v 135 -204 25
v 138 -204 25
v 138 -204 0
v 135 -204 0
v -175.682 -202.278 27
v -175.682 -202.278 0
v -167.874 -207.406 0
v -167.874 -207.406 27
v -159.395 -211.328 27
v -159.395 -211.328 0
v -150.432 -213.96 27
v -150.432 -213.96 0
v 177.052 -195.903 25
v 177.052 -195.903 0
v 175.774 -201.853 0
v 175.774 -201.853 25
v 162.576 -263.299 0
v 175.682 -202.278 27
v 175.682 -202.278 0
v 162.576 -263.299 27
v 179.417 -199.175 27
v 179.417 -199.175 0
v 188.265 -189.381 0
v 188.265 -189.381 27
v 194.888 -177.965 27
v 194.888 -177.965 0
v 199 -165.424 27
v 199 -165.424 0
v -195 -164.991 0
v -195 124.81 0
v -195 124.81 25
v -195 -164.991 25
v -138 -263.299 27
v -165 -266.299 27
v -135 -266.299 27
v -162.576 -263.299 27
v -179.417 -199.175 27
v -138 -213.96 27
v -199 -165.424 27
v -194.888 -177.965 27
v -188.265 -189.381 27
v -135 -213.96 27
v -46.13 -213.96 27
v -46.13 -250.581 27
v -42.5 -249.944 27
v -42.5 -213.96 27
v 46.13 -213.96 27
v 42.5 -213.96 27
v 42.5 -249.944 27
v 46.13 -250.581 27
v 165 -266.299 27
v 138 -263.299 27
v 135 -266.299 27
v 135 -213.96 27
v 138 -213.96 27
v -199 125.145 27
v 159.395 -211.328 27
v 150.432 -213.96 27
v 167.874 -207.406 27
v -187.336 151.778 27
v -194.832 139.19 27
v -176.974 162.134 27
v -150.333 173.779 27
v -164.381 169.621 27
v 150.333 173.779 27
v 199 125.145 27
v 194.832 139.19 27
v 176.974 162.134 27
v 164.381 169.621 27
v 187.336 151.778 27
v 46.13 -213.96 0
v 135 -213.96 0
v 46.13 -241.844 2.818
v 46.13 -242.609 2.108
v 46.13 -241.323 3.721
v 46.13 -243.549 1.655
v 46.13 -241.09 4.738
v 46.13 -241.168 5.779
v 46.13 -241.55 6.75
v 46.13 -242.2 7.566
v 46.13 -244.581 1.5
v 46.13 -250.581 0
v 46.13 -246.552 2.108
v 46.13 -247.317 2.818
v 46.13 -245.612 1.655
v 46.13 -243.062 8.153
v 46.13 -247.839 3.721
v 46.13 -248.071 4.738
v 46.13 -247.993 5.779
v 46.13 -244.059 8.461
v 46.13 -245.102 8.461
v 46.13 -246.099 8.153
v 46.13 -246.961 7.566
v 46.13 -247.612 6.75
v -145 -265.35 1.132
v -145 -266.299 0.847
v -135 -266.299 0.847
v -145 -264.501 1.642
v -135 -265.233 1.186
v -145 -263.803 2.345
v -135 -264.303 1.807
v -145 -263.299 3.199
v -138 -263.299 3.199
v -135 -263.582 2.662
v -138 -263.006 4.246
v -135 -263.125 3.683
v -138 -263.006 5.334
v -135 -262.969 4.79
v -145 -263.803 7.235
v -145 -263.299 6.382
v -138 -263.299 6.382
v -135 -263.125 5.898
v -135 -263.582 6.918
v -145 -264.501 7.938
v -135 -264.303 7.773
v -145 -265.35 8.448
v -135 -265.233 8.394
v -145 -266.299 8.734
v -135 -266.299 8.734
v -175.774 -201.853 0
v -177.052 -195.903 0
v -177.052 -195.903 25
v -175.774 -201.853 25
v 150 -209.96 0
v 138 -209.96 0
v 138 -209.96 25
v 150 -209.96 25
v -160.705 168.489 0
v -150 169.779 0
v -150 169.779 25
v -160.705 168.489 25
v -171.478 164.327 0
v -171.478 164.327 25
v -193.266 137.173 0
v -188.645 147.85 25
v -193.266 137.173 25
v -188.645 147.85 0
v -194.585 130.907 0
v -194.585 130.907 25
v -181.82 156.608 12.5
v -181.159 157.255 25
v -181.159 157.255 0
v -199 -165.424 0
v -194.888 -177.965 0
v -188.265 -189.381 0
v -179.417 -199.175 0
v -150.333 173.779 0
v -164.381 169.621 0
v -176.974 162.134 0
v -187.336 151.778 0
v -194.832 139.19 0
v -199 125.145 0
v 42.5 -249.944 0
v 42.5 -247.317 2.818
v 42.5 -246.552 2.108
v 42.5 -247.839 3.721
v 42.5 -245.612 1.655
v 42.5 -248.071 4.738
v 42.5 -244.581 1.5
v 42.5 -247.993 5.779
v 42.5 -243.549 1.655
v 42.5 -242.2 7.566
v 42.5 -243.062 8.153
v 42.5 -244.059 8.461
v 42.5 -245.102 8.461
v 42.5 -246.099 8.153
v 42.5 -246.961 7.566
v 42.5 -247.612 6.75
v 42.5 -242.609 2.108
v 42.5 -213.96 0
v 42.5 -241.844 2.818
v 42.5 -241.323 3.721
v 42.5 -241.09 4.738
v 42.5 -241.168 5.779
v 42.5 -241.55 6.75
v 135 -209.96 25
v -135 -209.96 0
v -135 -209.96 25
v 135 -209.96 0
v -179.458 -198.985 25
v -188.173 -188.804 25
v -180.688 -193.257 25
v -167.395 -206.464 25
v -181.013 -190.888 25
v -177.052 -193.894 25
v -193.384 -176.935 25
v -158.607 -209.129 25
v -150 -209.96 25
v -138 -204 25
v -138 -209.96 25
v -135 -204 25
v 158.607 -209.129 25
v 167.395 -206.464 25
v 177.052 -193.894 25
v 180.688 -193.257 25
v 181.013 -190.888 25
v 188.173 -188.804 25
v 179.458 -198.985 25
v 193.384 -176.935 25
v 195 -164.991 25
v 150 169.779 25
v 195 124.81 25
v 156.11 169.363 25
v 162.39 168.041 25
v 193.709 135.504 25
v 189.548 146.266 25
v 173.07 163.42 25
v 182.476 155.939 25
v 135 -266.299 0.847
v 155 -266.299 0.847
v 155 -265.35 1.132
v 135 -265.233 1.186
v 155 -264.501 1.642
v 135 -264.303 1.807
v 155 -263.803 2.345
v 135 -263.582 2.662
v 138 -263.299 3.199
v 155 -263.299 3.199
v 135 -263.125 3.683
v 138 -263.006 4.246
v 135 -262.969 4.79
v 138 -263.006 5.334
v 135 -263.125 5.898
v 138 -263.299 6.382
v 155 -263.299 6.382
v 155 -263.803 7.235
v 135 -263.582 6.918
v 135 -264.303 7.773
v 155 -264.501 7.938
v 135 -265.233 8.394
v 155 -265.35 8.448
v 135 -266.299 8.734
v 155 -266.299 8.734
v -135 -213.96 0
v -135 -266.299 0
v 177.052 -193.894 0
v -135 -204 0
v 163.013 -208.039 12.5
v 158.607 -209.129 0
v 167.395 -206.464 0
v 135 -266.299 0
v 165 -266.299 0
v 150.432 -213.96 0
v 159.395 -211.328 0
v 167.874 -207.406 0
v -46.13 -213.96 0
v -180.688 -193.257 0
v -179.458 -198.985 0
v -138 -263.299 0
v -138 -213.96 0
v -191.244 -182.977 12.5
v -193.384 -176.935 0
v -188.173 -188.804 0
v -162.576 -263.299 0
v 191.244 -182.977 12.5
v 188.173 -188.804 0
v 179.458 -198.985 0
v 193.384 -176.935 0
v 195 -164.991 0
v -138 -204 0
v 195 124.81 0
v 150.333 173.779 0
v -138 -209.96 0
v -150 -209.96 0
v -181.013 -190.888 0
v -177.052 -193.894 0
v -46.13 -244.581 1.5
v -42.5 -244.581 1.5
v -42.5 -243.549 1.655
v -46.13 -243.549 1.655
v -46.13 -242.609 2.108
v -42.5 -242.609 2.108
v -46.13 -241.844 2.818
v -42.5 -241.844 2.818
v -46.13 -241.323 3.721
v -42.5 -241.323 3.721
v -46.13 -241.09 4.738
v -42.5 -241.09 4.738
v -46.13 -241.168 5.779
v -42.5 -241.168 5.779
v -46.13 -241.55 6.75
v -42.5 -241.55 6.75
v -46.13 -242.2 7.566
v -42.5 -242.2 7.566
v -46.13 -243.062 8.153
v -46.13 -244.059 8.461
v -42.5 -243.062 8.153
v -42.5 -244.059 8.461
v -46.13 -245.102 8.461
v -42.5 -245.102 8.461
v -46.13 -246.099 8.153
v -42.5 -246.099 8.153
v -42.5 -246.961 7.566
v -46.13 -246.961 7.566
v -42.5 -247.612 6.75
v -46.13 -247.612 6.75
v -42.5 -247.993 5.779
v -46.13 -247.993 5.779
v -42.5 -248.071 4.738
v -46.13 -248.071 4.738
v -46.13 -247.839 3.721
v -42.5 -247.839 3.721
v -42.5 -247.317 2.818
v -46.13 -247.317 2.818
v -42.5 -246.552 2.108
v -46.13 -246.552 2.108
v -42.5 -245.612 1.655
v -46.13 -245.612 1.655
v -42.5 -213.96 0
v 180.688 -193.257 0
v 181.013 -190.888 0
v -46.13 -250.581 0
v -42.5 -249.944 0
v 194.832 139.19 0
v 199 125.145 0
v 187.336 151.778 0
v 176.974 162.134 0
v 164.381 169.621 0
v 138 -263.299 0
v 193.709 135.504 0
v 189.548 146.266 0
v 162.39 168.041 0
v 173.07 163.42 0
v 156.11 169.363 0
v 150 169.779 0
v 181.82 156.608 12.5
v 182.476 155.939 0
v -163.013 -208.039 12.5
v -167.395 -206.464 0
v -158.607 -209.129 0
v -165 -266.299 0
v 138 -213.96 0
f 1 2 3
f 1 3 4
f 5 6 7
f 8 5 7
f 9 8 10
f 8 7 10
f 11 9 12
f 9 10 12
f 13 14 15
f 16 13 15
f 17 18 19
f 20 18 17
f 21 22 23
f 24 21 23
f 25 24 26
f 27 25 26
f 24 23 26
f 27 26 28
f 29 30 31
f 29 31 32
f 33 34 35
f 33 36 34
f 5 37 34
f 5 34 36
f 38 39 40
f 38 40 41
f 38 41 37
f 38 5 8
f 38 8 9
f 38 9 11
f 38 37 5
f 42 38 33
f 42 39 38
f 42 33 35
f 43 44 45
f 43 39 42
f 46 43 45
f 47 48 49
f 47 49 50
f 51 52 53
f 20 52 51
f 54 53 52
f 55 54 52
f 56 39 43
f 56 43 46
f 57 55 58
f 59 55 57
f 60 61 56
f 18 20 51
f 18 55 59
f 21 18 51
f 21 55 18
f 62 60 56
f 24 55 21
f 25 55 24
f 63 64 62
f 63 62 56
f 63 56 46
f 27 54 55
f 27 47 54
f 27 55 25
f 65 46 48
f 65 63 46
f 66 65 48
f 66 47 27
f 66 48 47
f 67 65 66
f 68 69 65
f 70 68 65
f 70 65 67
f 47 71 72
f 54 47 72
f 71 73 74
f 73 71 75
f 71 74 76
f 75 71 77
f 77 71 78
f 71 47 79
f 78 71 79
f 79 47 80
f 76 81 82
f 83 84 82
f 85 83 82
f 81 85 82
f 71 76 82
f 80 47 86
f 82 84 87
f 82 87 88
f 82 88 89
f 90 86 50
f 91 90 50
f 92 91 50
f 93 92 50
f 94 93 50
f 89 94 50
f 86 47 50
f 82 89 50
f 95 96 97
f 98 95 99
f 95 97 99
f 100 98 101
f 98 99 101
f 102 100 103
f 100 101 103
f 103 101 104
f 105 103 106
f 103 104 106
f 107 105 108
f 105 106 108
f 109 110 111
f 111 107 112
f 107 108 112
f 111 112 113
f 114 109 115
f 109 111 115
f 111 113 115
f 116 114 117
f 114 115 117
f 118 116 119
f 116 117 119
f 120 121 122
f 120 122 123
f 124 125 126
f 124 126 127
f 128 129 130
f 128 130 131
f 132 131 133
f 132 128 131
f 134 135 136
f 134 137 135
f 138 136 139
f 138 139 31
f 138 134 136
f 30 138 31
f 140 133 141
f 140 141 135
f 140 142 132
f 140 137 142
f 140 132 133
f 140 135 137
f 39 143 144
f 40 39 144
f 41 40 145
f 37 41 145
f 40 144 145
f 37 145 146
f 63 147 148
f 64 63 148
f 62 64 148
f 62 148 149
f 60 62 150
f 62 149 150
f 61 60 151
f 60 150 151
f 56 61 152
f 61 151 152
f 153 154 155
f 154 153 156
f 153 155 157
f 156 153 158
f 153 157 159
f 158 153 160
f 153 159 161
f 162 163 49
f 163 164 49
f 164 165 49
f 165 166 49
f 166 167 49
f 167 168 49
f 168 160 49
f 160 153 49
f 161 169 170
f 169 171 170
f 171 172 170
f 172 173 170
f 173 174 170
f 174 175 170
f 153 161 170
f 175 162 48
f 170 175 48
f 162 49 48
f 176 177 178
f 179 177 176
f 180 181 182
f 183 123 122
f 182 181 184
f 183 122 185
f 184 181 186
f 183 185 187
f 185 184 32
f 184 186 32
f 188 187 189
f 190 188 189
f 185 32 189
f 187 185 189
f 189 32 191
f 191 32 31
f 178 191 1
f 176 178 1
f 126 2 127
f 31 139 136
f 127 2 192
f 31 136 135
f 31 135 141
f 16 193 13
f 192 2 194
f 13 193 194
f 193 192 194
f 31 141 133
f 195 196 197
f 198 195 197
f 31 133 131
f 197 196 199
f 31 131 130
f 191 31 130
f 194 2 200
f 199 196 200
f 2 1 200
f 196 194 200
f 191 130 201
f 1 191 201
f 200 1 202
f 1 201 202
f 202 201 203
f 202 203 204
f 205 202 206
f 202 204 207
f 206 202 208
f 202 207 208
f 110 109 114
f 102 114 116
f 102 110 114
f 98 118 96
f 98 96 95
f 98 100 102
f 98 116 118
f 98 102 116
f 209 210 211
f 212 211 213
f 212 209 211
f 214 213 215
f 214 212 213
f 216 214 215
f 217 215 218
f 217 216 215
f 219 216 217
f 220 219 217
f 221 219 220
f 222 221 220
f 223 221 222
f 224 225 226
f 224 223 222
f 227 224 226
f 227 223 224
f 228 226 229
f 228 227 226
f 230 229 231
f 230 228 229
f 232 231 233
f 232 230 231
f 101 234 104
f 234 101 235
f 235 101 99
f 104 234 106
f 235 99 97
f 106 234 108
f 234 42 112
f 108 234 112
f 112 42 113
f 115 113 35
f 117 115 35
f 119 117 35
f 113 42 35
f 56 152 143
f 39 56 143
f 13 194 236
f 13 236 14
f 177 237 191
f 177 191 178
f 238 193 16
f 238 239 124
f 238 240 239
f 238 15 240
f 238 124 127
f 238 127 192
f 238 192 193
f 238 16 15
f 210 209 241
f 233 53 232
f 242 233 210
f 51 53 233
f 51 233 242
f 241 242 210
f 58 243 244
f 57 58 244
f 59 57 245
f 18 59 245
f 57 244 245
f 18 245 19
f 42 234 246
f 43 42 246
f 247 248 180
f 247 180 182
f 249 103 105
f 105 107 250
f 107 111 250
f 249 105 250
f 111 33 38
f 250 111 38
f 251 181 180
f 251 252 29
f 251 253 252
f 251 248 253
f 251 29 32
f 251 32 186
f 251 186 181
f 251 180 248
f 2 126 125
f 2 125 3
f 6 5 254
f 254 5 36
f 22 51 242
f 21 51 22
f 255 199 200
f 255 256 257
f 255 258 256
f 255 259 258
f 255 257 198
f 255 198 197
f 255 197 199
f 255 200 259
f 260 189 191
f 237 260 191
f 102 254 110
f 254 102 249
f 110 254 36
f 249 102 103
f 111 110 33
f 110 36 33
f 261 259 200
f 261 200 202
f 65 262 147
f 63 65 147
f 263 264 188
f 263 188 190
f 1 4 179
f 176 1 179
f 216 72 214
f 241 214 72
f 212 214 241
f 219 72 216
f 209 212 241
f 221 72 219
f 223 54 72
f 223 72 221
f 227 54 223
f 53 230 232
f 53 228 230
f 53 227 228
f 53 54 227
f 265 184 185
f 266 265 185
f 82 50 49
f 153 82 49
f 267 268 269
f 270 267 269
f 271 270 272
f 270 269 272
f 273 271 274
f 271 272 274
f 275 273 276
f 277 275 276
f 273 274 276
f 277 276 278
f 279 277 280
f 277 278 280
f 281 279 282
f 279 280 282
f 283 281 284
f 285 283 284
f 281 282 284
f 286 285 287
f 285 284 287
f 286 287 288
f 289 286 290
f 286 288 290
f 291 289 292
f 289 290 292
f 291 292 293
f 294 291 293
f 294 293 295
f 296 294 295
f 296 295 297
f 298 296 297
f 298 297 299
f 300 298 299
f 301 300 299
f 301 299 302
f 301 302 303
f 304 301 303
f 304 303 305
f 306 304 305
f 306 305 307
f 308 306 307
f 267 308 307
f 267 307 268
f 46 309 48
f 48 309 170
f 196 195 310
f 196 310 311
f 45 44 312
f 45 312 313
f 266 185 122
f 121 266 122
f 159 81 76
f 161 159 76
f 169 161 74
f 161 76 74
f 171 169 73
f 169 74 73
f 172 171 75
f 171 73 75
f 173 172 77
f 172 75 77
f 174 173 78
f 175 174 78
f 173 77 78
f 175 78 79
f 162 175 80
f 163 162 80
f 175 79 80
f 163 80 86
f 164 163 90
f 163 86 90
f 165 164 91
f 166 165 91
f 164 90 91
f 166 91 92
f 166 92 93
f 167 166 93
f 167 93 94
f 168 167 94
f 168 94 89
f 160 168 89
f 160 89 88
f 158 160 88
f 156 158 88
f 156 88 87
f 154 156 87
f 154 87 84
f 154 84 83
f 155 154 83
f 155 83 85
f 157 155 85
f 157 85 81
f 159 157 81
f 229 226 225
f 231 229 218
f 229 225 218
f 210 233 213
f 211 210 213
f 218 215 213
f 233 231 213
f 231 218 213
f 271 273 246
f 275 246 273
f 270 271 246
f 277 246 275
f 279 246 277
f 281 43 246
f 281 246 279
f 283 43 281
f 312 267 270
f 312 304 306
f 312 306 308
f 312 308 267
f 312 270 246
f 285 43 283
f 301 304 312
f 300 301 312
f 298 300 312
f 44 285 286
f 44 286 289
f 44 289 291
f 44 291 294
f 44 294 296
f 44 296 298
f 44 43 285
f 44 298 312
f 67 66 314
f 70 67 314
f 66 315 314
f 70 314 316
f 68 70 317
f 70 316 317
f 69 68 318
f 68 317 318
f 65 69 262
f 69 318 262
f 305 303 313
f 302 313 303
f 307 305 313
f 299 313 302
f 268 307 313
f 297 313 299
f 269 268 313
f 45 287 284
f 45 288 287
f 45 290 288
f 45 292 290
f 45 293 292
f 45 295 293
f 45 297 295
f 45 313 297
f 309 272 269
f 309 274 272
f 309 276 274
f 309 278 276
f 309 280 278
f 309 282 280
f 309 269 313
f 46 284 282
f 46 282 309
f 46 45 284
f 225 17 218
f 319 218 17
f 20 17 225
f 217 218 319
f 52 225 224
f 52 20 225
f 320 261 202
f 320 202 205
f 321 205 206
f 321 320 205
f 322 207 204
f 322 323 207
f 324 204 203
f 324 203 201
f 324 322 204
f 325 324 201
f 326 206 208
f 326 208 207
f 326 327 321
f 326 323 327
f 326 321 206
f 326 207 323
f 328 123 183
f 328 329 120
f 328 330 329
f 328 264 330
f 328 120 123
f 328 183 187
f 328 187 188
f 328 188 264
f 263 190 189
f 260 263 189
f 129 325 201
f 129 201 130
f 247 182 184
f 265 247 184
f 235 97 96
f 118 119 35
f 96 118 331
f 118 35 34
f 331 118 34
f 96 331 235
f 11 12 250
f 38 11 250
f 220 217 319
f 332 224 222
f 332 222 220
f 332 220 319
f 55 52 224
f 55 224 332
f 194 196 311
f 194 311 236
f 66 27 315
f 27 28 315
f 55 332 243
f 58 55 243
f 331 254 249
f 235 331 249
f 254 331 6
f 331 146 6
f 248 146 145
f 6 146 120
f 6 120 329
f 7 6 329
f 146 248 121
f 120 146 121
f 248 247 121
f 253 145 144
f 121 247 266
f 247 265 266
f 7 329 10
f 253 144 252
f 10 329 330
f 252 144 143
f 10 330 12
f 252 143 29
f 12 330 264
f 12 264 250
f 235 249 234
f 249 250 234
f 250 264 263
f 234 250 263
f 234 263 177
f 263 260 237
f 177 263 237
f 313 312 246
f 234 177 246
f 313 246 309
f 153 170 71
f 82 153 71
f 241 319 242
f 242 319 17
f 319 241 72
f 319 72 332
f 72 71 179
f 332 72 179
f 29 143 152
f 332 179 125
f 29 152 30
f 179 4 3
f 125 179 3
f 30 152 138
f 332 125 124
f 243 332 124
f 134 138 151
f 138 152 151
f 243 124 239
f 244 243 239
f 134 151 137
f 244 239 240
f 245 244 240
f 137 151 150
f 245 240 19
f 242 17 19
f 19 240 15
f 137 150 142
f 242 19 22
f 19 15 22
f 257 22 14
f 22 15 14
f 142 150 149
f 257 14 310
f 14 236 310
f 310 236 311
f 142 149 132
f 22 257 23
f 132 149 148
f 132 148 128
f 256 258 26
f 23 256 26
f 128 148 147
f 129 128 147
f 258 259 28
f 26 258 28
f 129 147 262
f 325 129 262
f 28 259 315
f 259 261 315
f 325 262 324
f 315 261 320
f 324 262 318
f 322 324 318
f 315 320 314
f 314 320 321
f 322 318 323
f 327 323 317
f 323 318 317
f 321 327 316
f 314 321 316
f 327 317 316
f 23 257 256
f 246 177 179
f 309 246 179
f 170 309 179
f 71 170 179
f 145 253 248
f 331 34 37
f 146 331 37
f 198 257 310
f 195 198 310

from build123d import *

# Parameters (mm, degrees)
BOSS_EXTRUDE1_DEPTH     = 25
BOSS_EXTRUDE2_DEPTH     = 2
BOSS_EXTRUDE3_DEPTH     = 27
SKETCH4_R               = 4.000000001
CUT_EXTRUDE1_DEPTH      = 290
CUT_EXTRUDE1_DEPTH_BACK = 10
BOSS_EXTRUDE4_DEPTH     = 27
SKETCH6_R               = 3.5
CUT_EXTRUDE2_DEPTH      = 108


with BuildPart() as part:
    # Sketch1 → Boss-Extrude1 (new body)
    with BuildSketch(Plane.XY):
        with BuildLine():
            Line((-199, 125.145211216), (-199, -165.423939983))
            ThreePointArc((-199, -165.423939983), (-181.870436917, -196.8510269), (-150.43197765, -213.959708975))
            Line((-150.43197765, -213.959708975), (150.431977646, -213.959708975))
            ThreePointArc((150.431977646, -213.959708975), (181.870436916, -196.8510269), (199, -165.423939981))
            Line((199, -165.423939981), (199, 125.145211216))
            ThreePointArc((199, 125.145211216), (182.477306779, 157.278075491), (150.333498342, 173.779467463))
            Line((150.333498342, 173.779467463), (-150.333498342, 173.779467463))
            ThreePointArc((-150.333498342, 173.779467463), (-182.477306779, 157.278075491), (-199, 125.145211216))
        make_face()
        with BuildLine():
            Line((-195, 124.810354463), (-195, -164.990595976))
            add(Edge.make_bspline(
                [(-195, -164.990595976), (-195, -209.959708976), (-150, -209.959708975)],
                knots=[3.141592654, 3.141592654, 3.141592654, 4.71238898, 4.71238898, 4.71238898], degree=2, weights=[1, 0.707106781, 1]))
            Line((-150, -209.959708975), (149.999999997, -209.959708975))
            add(Edge.make_bspline(
                [(149.999999997, -209.959708975), (195.000000002, -209.959708979), (195, -164.990595974)],
                knots=[4.71238898, 4.71238898, 4.71238898, 6.283185307, 6.283185307, 6.283185307], degree=2, weights=[1, 0.707106781, 1]))
            Line((195, -164.990595974), (195, 124.810354463))
            add(Edge.make_bspline(
                [(195, 124.810354463), (195, 169.779467463), (150, 169.779467463)],
                knots=[3.141592654, 3.141592654, 3.141592654, 4.71238898, 4.71238898, 4.71238898], degree=2, weights=[1, 0.707106781, 1]))
            Line((150, 169.779467463), (-150, 169.779467463))
            add(Edge.make_bspline(
                [(-150, 169.779467463), (-195, 169.779467463), (-195, 124.810354463)],
                knots=[1.570796327, 1.570796327, 1.570796327, 3.141592654, 3.141592654, 3.141592654], degree=2, weights=[1, 0.707106781, 1]))
        make_face(mode=Mode.SUBTRACT)
    extrude(amount=BOSS_EXTRUDE1_DEPTH)

    # Sketch2 → Boss-Extrude2 (add)
    with BuildSketch(Plane.XY.offset(25)):
        with BuildLine():
            Line((-199, 125.145211216), (-199, -165.423939983))
            ThreePointArc((-199, -165.423939983), (-181.870436917, -196.8510269), (-150.43197765, -213.959708975))
            Line((-150.43197765, -213.959708975), (150.431977646, -213.959708975))
            ThreePointArc((150.431977646, -213.959708975), (181.870436916, -196.8510269), (199, -165.423939981))
            Line((199, -165.423939981), (199, 125.145211216))
            ThreePointArc((199, 125.145211216), (182.477306779, 157.278075491), (150.333498342, 173.779467463))
            Line((150.333498342, 173.779467463), (-150.333498342, 173.779467463))
            ThreePointArc((-150.333498342, 173.779467463), (-182.477306779, 157.278075491), (-199, 125.145211216))
        make_face()
    extrude(amount=BOSS_EXTRUDE2_DEPTH)

    # Sketch3 → Boss-Extrude3 (add)
    with BuildSketch(Plane.XY.offset(27)):
        Polygon((-135, -204), (-135, -266.298841042), (-165, -266.298841042), (-180.688480604, -193.256655723), (-181.013326297, -190.888401224), (-177.05169199, -193.894319256), (-177.05169199, -195.902858929), (-162.575940018, -263.298841042), (-138, -263.298841042), (-138, -204), align=None)
    boss_extrude3 = extrude(amount=-BOSS_EXTRUDE3_DEPTH)

    # Mirror1: Boss-Extrude3 across plane
    add(boss_extrude3.mirror(Plane(origin=(0, 0, 0), x_dir=(0, 0, 1), z_dir=(1, 0, 0))))

    # Sketch4 → Cut-Extrude1 (cut, two sides)
    with BuildSketch(Plane(origin=(-135, 0, 0), x_dir=(0, 0, -1), z_dir=(1, 0, 0))) as cut_extrude1_sk:
        with Locations((-4.790160487, -266.968568277)):
            Circle(SKETCH4_R)
    extrude(amount=CUT_EXTRUDE1_DEPTH, mode=Mode.SUBTRACT)
    extrude(cut_extrude1_sk.sketch, amount=-CUT_EXTRUDE1_DEPTH_BACK, mode=Mode.SUBTRACT)

    # Sketch5 → Boss-Extrude4 (add)
    with BuildSketch(Plane.XY.offset(27)):
        Polygon((-46.130462584, -213.959708975), (-46.130462584, -250.580628677), (-42.5, -249.943543539), (-42.5, -213.959708975), align=None)
        Polygon((46.130462584, -250.580628677), (42.5, -249.943543539), (42.5, -213.959708975), (46.130462584, -213.959708975), align=None)
    extrude(amount=-BOSS_EXTRUDE4_DEPTH)

    # Sketch6 → Cut-Extrude2 (cut)
    with BuildSketch(Plane(origin=(46.130462584, 0, 0), x_dir=(0, 0, -1), z_dir=(1, 0, 0))):
        with Locations((-4.999999906, -244.580628739)):
            Circle(SKETCH6_R)
    extrude(amount=-CUT_EXTRUDE2_DEPTH, mode=Mode.SUBTRACT)


solid = part.part
